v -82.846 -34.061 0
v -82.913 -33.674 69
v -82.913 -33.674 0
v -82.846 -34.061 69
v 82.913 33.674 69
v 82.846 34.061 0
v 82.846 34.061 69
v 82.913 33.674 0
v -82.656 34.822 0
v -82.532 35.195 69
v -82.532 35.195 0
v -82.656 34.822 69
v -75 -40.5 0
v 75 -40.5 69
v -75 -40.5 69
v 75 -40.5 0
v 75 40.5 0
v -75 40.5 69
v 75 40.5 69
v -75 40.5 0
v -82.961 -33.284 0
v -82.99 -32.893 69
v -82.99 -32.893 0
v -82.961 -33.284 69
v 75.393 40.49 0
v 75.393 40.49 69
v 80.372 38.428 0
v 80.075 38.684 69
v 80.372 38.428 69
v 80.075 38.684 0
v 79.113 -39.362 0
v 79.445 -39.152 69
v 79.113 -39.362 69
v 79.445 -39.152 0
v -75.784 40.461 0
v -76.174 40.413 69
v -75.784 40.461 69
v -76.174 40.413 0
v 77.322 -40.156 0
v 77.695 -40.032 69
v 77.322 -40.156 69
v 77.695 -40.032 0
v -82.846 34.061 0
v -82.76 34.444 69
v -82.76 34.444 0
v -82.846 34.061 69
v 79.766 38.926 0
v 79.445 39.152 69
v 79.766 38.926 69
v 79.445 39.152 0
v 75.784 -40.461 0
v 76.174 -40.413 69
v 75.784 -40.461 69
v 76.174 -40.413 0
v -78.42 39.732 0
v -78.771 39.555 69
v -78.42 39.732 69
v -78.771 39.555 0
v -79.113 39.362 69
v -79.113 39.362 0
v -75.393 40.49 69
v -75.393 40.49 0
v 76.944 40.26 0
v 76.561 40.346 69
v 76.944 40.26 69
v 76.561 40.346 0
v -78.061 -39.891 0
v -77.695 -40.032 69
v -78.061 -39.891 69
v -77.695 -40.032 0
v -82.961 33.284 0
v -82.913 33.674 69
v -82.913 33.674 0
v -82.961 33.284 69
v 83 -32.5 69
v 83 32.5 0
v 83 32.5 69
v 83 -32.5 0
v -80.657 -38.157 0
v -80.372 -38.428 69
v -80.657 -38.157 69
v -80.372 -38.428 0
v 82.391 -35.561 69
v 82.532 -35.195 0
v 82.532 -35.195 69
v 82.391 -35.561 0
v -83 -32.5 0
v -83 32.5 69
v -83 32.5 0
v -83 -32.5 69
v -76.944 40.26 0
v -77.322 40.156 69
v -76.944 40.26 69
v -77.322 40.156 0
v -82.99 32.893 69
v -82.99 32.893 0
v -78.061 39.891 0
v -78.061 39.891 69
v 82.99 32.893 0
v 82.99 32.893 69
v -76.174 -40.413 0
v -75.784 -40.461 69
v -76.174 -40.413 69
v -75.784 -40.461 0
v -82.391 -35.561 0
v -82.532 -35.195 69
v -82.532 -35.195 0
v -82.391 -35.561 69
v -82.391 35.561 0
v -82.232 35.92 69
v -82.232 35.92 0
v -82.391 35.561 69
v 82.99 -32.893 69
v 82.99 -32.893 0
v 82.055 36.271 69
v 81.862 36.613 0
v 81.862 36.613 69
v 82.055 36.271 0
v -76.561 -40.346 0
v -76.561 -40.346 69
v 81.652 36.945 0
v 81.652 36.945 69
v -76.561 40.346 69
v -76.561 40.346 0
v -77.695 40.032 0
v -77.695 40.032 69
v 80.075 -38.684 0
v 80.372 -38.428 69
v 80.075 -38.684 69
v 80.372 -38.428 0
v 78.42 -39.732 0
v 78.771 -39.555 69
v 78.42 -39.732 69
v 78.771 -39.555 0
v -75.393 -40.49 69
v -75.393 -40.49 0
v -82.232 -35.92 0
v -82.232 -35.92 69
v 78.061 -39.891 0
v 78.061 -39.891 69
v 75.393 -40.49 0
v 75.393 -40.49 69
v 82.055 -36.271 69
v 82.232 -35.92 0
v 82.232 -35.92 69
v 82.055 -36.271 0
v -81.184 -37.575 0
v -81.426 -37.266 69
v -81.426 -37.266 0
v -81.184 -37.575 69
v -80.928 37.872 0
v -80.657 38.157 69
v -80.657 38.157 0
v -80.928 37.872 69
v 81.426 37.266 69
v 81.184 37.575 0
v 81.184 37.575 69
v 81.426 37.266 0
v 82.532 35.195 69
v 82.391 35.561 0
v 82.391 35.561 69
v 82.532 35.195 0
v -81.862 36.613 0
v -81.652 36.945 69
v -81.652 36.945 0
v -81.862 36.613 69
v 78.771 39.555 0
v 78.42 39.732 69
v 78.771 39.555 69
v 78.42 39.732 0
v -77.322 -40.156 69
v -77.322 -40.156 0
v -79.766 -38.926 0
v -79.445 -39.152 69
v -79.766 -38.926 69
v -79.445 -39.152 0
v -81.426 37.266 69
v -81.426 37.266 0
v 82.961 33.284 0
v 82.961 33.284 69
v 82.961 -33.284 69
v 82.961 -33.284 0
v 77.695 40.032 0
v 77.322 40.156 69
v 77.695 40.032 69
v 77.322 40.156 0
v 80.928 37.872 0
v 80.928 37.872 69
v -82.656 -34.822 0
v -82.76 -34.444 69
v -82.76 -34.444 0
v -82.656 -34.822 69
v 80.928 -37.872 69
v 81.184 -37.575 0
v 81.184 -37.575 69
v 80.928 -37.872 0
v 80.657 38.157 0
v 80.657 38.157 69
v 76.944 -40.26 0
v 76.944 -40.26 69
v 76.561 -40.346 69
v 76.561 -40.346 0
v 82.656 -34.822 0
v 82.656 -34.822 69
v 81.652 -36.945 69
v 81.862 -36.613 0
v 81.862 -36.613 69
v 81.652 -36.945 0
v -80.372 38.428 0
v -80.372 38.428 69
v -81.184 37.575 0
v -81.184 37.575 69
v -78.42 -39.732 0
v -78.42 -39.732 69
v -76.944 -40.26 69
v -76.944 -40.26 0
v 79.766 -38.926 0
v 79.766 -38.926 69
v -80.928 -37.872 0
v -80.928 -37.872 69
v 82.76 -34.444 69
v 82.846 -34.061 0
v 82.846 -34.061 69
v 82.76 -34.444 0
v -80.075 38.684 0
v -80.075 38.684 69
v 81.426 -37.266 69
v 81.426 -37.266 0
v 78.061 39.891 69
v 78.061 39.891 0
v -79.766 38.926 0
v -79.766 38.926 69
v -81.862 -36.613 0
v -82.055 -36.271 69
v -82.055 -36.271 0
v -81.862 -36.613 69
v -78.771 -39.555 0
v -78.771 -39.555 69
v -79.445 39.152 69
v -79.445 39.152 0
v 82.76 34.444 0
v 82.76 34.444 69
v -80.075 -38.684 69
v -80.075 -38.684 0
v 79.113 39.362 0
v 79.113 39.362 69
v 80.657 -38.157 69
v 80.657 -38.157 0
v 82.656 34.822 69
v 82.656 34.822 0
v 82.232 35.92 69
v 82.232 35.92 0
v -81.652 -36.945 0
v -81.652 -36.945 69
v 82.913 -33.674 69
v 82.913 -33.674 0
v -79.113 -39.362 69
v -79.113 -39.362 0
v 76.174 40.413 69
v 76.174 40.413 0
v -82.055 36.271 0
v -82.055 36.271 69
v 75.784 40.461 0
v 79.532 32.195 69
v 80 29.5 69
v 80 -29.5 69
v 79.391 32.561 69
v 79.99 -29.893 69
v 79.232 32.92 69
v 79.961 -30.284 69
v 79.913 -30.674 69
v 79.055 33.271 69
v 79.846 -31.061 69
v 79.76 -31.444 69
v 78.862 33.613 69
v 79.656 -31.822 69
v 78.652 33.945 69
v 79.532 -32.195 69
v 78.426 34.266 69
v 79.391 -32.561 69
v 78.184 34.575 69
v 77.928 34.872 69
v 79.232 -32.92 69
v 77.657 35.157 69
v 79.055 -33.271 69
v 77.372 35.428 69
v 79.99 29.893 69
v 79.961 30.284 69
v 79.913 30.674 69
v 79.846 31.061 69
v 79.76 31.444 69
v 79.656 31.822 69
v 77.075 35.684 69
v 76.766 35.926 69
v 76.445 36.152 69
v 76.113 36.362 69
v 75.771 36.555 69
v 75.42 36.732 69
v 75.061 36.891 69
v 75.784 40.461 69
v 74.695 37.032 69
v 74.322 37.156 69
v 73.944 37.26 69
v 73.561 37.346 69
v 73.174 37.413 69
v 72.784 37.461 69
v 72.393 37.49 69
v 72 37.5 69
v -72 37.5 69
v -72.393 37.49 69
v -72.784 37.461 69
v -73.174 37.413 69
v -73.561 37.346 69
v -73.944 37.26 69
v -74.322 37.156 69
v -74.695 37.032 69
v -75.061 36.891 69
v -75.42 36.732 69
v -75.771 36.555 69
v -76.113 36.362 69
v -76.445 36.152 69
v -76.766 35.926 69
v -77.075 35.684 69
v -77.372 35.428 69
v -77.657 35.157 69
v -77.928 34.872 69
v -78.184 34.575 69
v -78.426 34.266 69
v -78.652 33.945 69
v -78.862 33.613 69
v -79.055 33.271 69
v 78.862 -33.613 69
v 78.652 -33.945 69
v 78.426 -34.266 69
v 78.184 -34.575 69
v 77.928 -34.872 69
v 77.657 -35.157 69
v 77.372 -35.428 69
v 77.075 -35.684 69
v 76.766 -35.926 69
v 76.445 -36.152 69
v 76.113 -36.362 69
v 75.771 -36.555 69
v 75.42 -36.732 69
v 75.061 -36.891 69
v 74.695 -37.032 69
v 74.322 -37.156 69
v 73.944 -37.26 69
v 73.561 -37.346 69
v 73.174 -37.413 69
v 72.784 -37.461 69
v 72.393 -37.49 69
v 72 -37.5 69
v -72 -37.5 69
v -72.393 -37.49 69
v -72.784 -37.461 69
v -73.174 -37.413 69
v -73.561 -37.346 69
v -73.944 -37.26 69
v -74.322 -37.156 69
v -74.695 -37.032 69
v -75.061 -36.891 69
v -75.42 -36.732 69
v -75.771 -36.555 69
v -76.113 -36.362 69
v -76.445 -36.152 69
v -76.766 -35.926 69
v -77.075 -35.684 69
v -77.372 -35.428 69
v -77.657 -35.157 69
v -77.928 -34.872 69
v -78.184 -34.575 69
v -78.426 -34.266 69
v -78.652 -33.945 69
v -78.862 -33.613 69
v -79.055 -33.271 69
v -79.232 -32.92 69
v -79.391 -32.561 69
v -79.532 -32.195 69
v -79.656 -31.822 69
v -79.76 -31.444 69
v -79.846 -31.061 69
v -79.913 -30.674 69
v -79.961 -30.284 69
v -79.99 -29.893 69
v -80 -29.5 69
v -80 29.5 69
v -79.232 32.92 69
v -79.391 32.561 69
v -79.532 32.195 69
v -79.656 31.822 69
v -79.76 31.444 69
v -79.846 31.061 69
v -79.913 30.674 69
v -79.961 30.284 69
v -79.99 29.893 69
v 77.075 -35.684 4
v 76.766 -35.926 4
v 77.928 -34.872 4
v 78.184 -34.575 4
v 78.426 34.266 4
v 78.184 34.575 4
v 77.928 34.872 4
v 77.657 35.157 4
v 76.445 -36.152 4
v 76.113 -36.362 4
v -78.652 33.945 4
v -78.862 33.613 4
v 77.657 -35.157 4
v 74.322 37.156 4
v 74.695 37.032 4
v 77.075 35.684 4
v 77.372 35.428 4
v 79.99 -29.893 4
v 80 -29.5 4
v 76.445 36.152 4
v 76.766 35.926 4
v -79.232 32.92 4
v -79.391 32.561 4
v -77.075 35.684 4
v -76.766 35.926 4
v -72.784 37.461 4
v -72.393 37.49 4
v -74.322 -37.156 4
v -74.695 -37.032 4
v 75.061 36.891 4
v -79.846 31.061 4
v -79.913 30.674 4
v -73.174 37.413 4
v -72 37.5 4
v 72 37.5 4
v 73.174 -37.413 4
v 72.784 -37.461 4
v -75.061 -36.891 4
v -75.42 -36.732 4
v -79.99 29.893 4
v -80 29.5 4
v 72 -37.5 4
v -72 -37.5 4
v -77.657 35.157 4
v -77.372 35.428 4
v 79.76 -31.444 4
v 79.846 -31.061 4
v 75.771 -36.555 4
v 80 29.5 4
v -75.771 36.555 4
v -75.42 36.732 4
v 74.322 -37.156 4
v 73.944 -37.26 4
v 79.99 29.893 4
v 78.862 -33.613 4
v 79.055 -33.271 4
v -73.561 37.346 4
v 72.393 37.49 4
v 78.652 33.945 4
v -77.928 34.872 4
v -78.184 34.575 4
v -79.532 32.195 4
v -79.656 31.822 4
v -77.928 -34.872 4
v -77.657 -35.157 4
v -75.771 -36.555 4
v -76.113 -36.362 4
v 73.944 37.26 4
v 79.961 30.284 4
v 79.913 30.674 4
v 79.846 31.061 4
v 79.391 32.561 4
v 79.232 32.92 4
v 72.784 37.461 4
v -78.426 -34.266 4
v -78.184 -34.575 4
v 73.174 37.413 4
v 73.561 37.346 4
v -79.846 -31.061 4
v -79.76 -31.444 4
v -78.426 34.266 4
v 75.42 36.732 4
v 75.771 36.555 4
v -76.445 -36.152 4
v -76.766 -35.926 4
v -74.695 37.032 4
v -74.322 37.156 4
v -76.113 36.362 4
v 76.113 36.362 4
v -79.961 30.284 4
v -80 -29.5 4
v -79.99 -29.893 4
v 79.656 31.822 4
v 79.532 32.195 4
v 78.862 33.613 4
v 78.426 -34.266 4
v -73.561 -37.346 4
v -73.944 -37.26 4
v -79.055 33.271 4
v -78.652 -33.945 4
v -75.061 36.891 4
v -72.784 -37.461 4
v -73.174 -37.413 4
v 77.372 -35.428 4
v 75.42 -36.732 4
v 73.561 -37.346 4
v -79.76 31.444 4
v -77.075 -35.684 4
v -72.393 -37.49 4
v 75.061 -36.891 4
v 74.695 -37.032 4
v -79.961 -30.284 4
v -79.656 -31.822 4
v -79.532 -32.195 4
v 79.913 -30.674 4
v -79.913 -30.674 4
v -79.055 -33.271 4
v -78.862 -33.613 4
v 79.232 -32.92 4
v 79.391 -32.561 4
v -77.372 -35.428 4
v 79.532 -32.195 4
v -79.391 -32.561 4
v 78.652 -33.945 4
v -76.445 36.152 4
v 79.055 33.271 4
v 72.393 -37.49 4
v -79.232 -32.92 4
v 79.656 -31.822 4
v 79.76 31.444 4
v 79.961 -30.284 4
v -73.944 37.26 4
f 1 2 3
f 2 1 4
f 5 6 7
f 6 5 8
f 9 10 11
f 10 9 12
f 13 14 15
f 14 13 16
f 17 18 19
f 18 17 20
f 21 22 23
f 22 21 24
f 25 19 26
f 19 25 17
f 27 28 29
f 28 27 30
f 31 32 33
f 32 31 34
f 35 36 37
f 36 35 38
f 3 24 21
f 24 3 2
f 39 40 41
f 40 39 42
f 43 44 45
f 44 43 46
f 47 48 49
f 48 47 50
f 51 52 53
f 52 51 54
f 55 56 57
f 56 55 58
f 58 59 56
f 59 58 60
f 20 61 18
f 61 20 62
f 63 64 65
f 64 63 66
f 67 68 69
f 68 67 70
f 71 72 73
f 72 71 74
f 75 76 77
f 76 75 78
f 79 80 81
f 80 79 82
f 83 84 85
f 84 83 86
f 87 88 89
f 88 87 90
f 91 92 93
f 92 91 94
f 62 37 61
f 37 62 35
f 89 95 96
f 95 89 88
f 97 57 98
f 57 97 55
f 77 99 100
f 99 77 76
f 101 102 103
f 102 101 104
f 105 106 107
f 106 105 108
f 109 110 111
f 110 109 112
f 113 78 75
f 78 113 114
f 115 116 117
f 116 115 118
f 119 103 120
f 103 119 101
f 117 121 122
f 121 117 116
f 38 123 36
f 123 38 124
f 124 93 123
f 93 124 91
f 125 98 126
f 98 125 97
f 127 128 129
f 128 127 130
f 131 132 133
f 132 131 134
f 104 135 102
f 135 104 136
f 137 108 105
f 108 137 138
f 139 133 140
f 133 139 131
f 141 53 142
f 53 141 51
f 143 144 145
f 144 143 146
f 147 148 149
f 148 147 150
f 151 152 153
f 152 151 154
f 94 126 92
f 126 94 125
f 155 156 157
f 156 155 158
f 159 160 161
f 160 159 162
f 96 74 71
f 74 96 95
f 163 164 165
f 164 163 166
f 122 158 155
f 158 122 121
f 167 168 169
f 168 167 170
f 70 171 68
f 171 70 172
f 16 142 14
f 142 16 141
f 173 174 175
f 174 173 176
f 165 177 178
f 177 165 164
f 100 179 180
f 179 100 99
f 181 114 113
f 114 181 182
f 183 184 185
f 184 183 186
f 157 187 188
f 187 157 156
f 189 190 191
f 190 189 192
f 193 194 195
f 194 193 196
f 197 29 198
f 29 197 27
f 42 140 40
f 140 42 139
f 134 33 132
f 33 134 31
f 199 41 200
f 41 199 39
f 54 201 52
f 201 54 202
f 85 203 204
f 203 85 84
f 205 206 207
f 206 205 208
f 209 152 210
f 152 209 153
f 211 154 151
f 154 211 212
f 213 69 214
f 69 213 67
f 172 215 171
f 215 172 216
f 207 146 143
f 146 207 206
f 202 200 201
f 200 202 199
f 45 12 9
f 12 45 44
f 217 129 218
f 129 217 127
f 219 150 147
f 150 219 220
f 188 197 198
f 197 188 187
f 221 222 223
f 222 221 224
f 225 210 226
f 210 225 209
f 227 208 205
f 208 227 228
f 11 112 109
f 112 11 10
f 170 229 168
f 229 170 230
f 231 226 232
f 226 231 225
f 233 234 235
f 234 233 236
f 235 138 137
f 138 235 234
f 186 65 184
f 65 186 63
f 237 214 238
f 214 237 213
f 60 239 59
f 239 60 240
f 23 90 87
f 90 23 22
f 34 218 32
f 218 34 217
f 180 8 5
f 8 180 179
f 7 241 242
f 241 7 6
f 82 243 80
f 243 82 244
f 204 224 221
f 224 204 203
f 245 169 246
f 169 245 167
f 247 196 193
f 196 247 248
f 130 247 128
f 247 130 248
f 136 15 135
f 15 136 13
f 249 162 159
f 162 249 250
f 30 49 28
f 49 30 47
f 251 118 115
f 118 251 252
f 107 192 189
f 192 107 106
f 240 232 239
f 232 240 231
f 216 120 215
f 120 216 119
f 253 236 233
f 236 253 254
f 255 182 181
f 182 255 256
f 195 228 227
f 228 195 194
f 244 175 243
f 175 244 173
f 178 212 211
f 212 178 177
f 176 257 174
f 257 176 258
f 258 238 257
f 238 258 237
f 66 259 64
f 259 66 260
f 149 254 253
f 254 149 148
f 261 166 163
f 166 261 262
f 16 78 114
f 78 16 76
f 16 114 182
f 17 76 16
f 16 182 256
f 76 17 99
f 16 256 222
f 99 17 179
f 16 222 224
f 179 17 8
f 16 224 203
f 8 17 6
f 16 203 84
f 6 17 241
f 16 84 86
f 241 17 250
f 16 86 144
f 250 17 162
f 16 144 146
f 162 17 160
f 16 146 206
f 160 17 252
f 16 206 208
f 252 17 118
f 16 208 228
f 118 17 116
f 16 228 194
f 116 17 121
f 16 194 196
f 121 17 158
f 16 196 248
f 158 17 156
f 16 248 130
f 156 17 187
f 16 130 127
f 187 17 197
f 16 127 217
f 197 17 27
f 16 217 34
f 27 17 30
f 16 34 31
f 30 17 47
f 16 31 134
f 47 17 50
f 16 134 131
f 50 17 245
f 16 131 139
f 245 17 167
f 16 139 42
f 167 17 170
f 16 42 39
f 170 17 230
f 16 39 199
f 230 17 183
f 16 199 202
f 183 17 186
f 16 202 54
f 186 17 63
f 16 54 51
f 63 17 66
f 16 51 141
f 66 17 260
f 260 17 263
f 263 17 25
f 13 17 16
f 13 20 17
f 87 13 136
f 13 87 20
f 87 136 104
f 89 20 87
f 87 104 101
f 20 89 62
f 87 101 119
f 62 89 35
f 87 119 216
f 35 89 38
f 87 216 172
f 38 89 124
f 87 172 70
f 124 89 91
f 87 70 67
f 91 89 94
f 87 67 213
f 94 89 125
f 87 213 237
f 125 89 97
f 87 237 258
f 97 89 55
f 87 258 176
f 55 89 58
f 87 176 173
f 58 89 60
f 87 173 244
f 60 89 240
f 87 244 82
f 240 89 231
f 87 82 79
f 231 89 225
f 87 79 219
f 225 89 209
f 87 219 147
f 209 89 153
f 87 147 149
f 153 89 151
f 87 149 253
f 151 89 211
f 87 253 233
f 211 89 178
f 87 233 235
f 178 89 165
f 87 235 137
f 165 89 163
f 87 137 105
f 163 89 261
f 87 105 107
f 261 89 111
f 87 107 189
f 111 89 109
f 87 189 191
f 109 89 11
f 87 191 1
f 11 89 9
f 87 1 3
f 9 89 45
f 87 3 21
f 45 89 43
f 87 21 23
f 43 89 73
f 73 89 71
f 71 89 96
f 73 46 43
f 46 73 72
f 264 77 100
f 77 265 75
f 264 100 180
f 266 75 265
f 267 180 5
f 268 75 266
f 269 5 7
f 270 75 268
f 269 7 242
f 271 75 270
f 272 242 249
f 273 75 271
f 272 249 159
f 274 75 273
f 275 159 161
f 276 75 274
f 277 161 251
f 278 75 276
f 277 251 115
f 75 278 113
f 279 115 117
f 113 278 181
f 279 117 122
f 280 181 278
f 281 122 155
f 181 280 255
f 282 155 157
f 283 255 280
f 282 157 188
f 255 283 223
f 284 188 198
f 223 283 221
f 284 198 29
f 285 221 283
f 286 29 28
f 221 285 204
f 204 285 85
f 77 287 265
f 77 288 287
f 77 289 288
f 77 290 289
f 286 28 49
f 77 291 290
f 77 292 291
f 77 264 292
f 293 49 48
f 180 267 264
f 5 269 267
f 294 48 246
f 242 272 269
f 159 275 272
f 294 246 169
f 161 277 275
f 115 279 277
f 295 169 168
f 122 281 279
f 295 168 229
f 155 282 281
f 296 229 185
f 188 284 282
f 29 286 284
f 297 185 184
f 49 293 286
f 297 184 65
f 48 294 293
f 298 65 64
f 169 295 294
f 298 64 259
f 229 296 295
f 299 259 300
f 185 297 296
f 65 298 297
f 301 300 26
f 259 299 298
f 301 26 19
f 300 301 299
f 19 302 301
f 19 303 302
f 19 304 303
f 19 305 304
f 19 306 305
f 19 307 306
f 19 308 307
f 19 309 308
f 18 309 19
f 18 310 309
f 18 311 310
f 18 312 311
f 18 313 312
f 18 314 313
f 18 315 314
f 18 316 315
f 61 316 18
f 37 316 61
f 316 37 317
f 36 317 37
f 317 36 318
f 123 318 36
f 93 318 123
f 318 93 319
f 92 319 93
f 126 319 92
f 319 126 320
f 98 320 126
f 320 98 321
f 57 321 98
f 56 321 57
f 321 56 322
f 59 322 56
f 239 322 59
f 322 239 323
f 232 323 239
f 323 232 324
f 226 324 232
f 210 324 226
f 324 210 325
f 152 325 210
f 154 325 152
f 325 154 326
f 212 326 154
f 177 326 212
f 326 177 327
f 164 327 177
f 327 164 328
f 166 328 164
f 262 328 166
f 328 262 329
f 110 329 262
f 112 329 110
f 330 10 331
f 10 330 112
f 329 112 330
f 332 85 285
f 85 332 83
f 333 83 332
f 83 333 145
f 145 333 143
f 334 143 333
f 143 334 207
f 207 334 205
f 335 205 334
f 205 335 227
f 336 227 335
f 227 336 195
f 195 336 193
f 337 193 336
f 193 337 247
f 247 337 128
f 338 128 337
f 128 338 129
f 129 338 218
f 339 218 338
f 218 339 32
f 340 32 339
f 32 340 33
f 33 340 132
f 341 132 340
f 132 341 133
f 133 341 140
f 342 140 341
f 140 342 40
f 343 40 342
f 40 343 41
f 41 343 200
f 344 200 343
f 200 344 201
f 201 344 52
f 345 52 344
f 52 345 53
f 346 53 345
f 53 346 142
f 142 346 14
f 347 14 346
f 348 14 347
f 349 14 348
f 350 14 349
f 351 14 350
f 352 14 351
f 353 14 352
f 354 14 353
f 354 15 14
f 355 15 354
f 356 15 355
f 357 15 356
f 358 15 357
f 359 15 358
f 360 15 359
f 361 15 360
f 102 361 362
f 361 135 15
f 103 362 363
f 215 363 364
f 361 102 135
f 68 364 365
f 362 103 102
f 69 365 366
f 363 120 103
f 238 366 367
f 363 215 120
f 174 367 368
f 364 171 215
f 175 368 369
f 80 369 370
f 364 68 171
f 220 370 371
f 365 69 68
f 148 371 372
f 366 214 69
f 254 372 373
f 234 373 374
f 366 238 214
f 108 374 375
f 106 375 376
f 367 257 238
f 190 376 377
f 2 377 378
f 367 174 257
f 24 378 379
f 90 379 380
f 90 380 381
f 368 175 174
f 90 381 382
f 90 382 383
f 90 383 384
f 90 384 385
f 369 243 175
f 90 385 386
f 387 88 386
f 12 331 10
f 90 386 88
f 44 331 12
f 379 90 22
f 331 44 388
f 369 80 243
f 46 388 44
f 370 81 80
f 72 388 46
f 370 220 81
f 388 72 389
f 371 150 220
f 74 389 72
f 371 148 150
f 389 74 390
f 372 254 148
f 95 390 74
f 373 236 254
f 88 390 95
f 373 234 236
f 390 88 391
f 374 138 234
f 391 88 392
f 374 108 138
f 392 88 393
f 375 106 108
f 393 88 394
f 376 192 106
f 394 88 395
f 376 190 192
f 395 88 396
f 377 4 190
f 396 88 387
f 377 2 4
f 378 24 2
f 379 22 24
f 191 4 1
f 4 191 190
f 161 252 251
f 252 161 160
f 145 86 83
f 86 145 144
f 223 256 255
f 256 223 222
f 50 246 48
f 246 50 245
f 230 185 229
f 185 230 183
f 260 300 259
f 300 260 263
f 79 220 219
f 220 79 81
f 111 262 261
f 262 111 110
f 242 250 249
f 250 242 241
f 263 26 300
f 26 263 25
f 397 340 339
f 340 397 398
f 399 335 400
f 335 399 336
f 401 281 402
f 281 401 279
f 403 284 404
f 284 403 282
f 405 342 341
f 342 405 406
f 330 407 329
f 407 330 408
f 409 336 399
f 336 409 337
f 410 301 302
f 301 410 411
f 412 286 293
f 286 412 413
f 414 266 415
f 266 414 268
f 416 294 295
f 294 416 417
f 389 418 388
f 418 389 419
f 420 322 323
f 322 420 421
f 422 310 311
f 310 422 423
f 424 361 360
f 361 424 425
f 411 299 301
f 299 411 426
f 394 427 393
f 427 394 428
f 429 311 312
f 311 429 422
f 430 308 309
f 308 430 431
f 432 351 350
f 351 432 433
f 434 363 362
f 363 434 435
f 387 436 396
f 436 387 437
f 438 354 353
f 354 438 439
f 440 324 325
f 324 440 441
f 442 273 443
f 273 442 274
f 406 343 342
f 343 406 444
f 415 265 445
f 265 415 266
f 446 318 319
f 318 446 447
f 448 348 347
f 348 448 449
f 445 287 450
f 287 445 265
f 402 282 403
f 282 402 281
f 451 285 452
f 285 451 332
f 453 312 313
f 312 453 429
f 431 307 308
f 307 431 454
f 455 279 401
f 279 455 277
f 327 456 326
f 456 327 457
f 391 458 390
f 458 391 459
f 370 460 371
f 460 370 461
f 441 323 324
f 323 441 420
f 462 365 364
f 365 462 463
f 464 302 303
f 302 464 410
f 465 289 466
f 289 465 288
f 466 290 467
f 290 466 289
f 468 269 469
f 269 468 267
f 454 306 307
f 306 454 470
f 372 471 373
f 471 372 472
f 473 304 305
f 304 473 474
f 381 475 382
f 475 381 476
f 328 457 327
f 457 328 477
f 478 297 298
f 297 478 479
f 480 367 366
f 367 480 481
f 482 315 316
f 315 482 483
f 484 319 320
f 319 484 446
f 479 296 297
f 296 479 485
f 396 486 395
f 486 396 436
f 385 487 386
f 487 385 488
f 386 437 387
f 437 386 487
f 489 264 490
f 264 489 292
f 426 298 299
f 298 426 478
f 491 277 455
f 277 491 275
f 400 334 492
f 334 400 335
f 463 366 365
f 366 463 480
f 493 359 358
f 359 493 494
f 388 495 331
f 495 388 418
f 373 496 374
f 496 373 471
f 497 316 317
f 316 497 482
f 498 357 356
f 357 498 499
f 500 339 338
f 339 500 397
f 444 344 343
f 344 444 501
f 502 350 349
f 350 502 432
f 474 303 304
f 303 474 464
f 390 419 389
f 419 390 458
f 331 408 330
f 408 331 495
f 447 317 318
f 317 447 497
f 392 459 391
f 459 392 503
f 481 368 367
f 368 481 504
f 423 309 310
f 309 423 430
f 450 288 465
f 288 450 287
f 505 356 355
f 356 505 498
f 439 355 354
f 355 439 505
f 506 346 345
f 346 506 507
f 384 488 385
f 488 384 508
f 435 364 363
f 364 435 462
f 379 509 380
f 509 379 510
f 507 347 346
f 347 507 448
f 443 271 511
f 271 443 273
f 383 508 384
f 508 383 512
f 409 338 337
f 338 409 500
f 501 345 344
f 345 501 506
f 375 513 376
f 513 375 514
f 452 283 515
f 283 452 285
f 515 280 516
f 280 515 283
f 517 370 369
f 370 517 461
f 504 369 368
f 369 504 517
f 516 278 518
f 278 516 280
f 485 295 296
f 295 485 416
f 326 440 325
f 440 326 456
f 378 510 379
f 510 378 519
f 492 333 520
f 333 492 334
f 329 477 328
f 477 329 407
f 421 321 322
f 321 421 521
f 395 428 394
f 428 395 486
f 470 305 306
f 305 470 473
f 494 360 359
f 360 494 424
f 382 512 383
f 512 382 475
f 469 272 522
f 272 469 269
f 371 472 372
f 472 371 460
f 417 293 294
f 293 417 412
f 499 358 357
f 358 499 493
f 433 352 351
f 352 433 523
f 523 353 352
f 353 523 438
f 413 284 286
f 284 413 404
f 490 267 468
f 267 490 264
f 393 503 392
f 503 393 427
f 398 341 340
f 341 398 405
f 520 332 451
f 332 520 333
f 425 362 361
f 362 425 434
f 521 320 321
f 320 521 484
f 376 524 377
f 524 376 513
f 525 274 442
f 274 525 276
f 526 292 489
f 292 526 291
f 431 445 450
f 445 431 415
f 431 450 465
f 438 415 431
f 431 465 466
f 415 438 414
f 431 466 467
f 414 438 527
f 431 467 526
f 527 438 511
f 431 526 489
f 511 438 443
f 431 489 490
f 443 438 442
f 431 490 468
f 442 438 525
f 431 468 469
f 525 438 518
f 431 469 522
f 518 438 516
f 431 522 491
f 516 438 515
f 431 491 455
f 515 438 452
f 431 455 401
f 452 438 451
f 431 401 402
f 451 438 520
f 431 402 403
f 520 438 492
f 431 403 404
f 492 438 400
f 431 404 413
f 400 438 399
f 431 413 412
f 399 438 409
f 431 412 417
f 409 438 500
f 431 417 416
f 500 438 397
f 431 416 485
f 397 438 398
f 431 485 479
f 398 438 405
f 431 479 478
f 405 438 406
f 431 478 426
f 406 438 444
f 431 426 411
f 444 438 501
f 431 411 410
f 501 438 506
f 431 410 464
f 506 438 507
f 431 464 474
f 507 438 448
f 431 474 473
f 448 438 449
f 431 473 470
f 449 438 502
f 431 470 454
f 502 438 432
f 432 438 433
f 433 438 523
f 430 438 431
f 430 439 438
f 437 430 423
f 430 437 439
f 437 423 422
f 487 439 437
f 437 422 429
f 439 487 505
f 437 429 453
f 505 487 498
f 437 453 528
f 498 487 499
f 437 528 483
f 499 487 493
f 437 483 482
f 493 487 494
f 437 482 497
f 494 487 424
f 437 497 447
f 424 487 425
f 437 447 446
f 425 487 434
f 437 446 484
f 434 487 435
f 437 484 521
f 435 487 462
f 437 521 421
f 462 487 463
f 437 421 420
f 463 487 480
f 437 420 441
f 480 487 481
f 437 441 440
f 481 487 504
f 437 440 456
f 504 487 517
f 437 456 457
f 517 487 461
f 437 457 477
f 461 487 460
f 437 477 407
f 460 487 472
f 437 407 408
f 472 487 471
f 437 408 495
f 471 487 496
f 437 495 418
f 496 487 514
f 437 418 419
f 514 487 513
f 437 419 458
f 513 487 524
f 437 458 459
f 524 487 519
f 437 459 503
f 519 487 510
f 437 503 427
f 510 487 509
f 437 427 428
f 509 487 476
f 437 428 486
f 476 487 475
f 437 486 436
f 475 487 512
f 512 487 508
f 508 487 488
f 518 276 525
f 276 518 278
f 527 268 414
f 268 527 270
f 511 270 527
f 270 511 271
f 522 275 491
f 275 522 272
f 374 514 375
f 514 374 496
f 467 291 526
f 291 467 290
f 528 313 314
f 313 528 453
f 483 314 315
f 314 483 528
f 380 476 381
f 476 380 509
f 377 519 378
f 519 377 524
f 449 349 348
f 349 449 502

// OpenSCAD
// file: YAPPE_Parameters.scad
//=====================================================================
// YAPPE Parameters
//
// This file contains the mechanical design parameters.
//
// Geometry modules should not define dimensions.
// They consume the values defined here.
//
//=====================================================================

//--------------------------------------------------
// Pump
//--------------------------------------------------

pump_length = 150;
pump_width  = 65;
pump_height = 60;


//--------------------------------------------------
// Clearances
//--------------------------------------------------

pump_side_clearance = 5;
pump_top_clearance  = 5;

box_fit_clearance = 0.35;


//--------------------------------------------------
// Box
//--------------------------------------------------

wall_thickness  = 3;
floor_thickness = 4;

corner_radius = 8;

//--------------------------------------------------
// Lid overlap
//--------------------------------------------------

lid_overlap = 15;         // mm


//--------------------------------------------------
// Inner box inside dimensions
//--------------------------------------------------

inner_inside_length =
    pump_length +
    (2 * pump_side_clearance);

inner_inside_width =
    pump_width +
    (2 * pump_side_clearance);

inner_inside_height =
    pump_height +
    pump_top_clearance;
	
//--------------------------------------------------
// Inner box outside dimensions
//--------------------------------------------------

inner_outside_length =
    inner_inside_length +
    (2 * wall_thickness);

inner_outside_width =
    inner_inside_width +
    (2 * wall_thickness);

inner_outside_height =
    inner_inside_height +
    floor_thickness;
	
//--------------------------------------------------
// Outer box inside dimensions
//--------------------------------------------------

outer_inside_length =
    inner_outside_length +
    (2 * box_fit_clearance);

outer_inside_width =
    inner_outside_width +
    (2 * box_fit_clearance);

outer_inside_height =
    inner_outside_height +
    lid_overlap;
	
//--------------------------------------------------
// Assembly centres
//--------------------------------------------------

inner_center_x = inner_outside_length / 2;
inner_center_y = inner_outside_width  / 2;

outer_center_x =
    (outer_inside_length + (2 * wall_thickness)) / 2;

outer_center_y =
    (outer_inside_width + (2 * wall_thickness)) / 2;
	
	
//--------------------------------------------------
// Rendering
//--------------------------------------------------

preview_fn = 24;
render_fn  = 128;

$fn = $preview ? preview_fn : render_fn;
// file: Modules/box.scad
//=====================================================================
// box.scad
//
// Generic rounded box
//
// Origin:
//   X = centre
//   Y = centre
//   Z = bottom
//
//=====================================================================


//--------------------------------------------------
// Rounded corner
//--------------------------------------------------

module corner(x, y, height, radius)
{
    translate([x, y, 0])
        cylinder(
            h = height,
            r = radius
        );
}


//--------------------------------------------------
// Outside shell
//--------------------------------------------------

module shell(
    outside_length,
    outside_width,
    outside_height,
    corner_radius
)
{
    hull()
    {
        corner(
            -(outside_length / 2) + corner_radius,
            -(outside_width / 2) + corner_radius,
            outside_height,
            corner_radius
        );

        corner(
             (outside_length / 2) - corner_radius,
            -(outside_width / 2) + corner_radius,
            outside_height,
            corner_radius
        );

        corner(
             (outside_length / 2) - corner_radius,
             (outside_width / 2) - corner_radius,
            outside_height,
            corner_radius
        );

        corner(
            -(outside_length / 2) + corner_radius,
             (outside_width / 2) - corner_radius,
            outside_height,
            corner_radius
        );
    }
}


//--------------------------------------------------
// Inside cavity
//--------------------------------------------------

module cavity(
    inside_length,
    inside_width,
    inside_height,
    wall_thickness,
    bottom_thickness,
    corner_radius,
    boolean_overlap = 1
)
{
    translate([
        0,
        0,
        bottom_thickness
    ])

    hull()
    {
        corner(
            -(inside_length / 2) + corner_radius,
            -(inside_width / 2) + corner_radius,
            inside_height + boolean_overlap,
            corner_radius
        );

        corner(
             (inside_length / 2) - corner_radius,
            -(inside_width / 2) + corner_radius,
            inside_height + boolean_overlap,
            corner_radius
        );

        corner(
             (inside_length / 2) - corner_radius,
             (inside_width / 2) - corner_radius,
            inside_height + boolean_overlap,
            corner_radius
        );

        corner(
            -(inside_length / 2) + corner_radius,
             (inside_width / 2) - corner_radius,
            inside_height + boolean_overlap,
            corner_radius
        );
    }
}


//--------------------------------------------------
// Rounded box
//--------------------------------------------------

module box(
    inside_length,
    inside_width,
    inside_height,

    wall_thickness,
    bottom_thickness,

    corner_radius,

    boolean_overlap = 1
)
{
    outside_length =
        inside_length +
        (2 * wall_thickness);

    outside_width =
        inside_width +
        (2 * wall_thickness);

    outside_height =
        inside_height +
        bottom_thickness;

    difference()
    {
        shell(
            outside_length,
            outside_width,
            outside_height,
            corner_radius
        );

        cavity(
            inside_length,
            inside_width,
            inside_height,
            wall_thickness,
            bottom_thickness,
            corner_radius,
            boolean_overlap
        );
    }
}
// main file
//=====================================================================
// YAPPE
// Inner Box
//
// Inner enclosure.
//
//=====================================================================

use <Modules/box.scad>;
include <YAPPE_Parameters.scad>;


//=====================================================================
// MODULES
//=====================================================================

module inner_box()
{
    box(
        inner_inside_length,
        inner_inside_width,
        inner_inside_height,

        wall_thickness,
        floor_thickness,

        corner_radius
    );
}


//=====================================================================
// MAIN
//=====================================================================

inner_box();
